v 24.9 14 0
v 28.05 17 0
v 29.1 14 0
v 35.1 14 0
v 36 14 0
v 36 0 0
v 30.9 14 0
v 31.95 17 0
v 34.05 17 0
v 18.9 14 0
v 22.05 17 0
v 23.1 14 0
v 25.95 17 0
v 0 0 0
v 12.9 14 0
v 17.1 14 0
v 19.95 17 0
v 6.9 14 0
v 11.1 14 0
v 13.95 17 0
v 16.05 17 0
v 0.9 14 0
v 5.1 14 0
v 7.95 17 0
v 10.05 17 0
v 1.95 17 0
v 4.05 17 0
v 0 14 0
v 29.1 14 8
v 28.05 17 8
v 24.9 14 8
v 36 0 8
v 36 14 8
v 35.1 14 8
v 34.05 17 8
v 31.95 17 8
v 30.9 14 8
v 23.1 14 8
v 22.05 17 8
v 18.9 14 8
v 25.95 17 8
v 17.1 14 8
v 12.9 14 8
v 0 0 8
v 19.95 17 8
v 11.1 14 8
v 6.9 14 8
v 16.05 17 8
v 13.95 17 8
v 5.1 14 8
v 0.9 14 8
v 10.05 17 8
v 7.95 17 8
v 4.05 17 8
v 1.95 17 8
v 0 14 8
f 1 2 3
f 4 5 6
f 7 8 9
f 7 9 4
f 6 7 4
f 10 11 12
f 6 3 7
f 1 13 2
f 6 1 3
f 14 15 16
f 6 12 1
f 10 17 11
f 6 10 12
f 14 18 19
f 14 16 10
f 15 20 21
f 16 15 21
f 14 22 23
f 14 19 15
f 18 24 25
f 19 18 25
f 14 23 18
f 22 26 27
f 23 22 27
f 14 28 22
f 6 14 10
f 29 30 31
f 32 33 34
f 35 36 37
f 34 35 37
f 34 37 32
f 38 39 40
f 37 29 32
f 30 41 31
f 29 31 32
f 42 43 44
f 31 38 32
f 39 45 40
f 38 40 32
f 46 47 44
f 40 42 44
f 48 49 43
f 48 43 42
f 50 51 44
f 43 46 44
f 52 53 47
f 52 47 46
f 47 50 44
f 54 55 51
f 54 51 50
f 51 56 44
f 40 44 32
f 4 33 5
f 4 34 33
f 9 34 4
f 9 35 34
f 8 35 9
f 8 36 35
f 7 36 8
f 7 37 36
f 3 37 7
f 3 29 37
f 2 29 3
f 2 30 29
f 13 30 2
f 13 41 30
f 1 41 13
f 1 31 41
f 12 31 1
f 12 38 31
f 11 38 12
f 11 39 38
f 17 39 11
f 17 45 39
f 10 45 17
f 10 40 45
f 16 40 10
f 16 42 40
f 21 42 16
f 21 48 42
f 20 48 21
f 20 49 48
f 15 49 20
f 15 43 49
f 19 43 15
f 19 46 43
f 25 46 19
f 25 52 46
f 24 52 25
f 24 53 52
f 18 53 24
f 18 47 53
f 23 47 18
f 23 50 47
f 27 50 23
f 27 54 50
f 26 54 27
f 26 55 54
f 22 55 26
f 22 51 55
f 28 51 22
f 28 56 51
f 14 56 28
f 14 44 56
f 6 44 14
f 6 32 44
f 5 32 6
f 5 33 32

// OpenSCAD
$fn = 32;

// ----------------------------------------------------------------------
// Gear rack: 6 teeth, pitch 6 mm
// ----------------------------------------------------------------------

// --- parameters (mm) ---
teeth = 6;                // number of teeth
pitch = 6;                // tooth pitch, X
root_w = 4.2;             // tooth width at the root
tip_w = 2.1;              // tooth width at the tip
base_h = 14;              // rack body height, Y
tooth_h = 3;              // tooth height above the body
plate_t = 8;              // rack width, Z (extrusion height)

rack_l = teeth * pitch;  // overall length
total_h = base_h + tooth_h;  // overall height

profile = [[0, 0], [36, 0], [36, 14], [35.1, 14], [34.05, 17], [31.95, 17], [30.9, 14], [29.1, 14], [28.05, 17], [25.95, 17], [24.9, 14], [23.1, 14], [22.05, 17], [19.95, 17], [18.9, 14], [17.1, 14], [16.05, 17], [13.95, 17], [12.9, 14], [11.1, 14], [10.05, 17], [7.95, 17], [6.9, 14], [5.1, 14], [4.05, 17], [1.95, 17], [0.9, 14], [0, 14]];  // primary outline, 28 points, counter clockwise

// --- the one profile operation ---
linear_extrude(height = plate_t) polygon(points = profile);
